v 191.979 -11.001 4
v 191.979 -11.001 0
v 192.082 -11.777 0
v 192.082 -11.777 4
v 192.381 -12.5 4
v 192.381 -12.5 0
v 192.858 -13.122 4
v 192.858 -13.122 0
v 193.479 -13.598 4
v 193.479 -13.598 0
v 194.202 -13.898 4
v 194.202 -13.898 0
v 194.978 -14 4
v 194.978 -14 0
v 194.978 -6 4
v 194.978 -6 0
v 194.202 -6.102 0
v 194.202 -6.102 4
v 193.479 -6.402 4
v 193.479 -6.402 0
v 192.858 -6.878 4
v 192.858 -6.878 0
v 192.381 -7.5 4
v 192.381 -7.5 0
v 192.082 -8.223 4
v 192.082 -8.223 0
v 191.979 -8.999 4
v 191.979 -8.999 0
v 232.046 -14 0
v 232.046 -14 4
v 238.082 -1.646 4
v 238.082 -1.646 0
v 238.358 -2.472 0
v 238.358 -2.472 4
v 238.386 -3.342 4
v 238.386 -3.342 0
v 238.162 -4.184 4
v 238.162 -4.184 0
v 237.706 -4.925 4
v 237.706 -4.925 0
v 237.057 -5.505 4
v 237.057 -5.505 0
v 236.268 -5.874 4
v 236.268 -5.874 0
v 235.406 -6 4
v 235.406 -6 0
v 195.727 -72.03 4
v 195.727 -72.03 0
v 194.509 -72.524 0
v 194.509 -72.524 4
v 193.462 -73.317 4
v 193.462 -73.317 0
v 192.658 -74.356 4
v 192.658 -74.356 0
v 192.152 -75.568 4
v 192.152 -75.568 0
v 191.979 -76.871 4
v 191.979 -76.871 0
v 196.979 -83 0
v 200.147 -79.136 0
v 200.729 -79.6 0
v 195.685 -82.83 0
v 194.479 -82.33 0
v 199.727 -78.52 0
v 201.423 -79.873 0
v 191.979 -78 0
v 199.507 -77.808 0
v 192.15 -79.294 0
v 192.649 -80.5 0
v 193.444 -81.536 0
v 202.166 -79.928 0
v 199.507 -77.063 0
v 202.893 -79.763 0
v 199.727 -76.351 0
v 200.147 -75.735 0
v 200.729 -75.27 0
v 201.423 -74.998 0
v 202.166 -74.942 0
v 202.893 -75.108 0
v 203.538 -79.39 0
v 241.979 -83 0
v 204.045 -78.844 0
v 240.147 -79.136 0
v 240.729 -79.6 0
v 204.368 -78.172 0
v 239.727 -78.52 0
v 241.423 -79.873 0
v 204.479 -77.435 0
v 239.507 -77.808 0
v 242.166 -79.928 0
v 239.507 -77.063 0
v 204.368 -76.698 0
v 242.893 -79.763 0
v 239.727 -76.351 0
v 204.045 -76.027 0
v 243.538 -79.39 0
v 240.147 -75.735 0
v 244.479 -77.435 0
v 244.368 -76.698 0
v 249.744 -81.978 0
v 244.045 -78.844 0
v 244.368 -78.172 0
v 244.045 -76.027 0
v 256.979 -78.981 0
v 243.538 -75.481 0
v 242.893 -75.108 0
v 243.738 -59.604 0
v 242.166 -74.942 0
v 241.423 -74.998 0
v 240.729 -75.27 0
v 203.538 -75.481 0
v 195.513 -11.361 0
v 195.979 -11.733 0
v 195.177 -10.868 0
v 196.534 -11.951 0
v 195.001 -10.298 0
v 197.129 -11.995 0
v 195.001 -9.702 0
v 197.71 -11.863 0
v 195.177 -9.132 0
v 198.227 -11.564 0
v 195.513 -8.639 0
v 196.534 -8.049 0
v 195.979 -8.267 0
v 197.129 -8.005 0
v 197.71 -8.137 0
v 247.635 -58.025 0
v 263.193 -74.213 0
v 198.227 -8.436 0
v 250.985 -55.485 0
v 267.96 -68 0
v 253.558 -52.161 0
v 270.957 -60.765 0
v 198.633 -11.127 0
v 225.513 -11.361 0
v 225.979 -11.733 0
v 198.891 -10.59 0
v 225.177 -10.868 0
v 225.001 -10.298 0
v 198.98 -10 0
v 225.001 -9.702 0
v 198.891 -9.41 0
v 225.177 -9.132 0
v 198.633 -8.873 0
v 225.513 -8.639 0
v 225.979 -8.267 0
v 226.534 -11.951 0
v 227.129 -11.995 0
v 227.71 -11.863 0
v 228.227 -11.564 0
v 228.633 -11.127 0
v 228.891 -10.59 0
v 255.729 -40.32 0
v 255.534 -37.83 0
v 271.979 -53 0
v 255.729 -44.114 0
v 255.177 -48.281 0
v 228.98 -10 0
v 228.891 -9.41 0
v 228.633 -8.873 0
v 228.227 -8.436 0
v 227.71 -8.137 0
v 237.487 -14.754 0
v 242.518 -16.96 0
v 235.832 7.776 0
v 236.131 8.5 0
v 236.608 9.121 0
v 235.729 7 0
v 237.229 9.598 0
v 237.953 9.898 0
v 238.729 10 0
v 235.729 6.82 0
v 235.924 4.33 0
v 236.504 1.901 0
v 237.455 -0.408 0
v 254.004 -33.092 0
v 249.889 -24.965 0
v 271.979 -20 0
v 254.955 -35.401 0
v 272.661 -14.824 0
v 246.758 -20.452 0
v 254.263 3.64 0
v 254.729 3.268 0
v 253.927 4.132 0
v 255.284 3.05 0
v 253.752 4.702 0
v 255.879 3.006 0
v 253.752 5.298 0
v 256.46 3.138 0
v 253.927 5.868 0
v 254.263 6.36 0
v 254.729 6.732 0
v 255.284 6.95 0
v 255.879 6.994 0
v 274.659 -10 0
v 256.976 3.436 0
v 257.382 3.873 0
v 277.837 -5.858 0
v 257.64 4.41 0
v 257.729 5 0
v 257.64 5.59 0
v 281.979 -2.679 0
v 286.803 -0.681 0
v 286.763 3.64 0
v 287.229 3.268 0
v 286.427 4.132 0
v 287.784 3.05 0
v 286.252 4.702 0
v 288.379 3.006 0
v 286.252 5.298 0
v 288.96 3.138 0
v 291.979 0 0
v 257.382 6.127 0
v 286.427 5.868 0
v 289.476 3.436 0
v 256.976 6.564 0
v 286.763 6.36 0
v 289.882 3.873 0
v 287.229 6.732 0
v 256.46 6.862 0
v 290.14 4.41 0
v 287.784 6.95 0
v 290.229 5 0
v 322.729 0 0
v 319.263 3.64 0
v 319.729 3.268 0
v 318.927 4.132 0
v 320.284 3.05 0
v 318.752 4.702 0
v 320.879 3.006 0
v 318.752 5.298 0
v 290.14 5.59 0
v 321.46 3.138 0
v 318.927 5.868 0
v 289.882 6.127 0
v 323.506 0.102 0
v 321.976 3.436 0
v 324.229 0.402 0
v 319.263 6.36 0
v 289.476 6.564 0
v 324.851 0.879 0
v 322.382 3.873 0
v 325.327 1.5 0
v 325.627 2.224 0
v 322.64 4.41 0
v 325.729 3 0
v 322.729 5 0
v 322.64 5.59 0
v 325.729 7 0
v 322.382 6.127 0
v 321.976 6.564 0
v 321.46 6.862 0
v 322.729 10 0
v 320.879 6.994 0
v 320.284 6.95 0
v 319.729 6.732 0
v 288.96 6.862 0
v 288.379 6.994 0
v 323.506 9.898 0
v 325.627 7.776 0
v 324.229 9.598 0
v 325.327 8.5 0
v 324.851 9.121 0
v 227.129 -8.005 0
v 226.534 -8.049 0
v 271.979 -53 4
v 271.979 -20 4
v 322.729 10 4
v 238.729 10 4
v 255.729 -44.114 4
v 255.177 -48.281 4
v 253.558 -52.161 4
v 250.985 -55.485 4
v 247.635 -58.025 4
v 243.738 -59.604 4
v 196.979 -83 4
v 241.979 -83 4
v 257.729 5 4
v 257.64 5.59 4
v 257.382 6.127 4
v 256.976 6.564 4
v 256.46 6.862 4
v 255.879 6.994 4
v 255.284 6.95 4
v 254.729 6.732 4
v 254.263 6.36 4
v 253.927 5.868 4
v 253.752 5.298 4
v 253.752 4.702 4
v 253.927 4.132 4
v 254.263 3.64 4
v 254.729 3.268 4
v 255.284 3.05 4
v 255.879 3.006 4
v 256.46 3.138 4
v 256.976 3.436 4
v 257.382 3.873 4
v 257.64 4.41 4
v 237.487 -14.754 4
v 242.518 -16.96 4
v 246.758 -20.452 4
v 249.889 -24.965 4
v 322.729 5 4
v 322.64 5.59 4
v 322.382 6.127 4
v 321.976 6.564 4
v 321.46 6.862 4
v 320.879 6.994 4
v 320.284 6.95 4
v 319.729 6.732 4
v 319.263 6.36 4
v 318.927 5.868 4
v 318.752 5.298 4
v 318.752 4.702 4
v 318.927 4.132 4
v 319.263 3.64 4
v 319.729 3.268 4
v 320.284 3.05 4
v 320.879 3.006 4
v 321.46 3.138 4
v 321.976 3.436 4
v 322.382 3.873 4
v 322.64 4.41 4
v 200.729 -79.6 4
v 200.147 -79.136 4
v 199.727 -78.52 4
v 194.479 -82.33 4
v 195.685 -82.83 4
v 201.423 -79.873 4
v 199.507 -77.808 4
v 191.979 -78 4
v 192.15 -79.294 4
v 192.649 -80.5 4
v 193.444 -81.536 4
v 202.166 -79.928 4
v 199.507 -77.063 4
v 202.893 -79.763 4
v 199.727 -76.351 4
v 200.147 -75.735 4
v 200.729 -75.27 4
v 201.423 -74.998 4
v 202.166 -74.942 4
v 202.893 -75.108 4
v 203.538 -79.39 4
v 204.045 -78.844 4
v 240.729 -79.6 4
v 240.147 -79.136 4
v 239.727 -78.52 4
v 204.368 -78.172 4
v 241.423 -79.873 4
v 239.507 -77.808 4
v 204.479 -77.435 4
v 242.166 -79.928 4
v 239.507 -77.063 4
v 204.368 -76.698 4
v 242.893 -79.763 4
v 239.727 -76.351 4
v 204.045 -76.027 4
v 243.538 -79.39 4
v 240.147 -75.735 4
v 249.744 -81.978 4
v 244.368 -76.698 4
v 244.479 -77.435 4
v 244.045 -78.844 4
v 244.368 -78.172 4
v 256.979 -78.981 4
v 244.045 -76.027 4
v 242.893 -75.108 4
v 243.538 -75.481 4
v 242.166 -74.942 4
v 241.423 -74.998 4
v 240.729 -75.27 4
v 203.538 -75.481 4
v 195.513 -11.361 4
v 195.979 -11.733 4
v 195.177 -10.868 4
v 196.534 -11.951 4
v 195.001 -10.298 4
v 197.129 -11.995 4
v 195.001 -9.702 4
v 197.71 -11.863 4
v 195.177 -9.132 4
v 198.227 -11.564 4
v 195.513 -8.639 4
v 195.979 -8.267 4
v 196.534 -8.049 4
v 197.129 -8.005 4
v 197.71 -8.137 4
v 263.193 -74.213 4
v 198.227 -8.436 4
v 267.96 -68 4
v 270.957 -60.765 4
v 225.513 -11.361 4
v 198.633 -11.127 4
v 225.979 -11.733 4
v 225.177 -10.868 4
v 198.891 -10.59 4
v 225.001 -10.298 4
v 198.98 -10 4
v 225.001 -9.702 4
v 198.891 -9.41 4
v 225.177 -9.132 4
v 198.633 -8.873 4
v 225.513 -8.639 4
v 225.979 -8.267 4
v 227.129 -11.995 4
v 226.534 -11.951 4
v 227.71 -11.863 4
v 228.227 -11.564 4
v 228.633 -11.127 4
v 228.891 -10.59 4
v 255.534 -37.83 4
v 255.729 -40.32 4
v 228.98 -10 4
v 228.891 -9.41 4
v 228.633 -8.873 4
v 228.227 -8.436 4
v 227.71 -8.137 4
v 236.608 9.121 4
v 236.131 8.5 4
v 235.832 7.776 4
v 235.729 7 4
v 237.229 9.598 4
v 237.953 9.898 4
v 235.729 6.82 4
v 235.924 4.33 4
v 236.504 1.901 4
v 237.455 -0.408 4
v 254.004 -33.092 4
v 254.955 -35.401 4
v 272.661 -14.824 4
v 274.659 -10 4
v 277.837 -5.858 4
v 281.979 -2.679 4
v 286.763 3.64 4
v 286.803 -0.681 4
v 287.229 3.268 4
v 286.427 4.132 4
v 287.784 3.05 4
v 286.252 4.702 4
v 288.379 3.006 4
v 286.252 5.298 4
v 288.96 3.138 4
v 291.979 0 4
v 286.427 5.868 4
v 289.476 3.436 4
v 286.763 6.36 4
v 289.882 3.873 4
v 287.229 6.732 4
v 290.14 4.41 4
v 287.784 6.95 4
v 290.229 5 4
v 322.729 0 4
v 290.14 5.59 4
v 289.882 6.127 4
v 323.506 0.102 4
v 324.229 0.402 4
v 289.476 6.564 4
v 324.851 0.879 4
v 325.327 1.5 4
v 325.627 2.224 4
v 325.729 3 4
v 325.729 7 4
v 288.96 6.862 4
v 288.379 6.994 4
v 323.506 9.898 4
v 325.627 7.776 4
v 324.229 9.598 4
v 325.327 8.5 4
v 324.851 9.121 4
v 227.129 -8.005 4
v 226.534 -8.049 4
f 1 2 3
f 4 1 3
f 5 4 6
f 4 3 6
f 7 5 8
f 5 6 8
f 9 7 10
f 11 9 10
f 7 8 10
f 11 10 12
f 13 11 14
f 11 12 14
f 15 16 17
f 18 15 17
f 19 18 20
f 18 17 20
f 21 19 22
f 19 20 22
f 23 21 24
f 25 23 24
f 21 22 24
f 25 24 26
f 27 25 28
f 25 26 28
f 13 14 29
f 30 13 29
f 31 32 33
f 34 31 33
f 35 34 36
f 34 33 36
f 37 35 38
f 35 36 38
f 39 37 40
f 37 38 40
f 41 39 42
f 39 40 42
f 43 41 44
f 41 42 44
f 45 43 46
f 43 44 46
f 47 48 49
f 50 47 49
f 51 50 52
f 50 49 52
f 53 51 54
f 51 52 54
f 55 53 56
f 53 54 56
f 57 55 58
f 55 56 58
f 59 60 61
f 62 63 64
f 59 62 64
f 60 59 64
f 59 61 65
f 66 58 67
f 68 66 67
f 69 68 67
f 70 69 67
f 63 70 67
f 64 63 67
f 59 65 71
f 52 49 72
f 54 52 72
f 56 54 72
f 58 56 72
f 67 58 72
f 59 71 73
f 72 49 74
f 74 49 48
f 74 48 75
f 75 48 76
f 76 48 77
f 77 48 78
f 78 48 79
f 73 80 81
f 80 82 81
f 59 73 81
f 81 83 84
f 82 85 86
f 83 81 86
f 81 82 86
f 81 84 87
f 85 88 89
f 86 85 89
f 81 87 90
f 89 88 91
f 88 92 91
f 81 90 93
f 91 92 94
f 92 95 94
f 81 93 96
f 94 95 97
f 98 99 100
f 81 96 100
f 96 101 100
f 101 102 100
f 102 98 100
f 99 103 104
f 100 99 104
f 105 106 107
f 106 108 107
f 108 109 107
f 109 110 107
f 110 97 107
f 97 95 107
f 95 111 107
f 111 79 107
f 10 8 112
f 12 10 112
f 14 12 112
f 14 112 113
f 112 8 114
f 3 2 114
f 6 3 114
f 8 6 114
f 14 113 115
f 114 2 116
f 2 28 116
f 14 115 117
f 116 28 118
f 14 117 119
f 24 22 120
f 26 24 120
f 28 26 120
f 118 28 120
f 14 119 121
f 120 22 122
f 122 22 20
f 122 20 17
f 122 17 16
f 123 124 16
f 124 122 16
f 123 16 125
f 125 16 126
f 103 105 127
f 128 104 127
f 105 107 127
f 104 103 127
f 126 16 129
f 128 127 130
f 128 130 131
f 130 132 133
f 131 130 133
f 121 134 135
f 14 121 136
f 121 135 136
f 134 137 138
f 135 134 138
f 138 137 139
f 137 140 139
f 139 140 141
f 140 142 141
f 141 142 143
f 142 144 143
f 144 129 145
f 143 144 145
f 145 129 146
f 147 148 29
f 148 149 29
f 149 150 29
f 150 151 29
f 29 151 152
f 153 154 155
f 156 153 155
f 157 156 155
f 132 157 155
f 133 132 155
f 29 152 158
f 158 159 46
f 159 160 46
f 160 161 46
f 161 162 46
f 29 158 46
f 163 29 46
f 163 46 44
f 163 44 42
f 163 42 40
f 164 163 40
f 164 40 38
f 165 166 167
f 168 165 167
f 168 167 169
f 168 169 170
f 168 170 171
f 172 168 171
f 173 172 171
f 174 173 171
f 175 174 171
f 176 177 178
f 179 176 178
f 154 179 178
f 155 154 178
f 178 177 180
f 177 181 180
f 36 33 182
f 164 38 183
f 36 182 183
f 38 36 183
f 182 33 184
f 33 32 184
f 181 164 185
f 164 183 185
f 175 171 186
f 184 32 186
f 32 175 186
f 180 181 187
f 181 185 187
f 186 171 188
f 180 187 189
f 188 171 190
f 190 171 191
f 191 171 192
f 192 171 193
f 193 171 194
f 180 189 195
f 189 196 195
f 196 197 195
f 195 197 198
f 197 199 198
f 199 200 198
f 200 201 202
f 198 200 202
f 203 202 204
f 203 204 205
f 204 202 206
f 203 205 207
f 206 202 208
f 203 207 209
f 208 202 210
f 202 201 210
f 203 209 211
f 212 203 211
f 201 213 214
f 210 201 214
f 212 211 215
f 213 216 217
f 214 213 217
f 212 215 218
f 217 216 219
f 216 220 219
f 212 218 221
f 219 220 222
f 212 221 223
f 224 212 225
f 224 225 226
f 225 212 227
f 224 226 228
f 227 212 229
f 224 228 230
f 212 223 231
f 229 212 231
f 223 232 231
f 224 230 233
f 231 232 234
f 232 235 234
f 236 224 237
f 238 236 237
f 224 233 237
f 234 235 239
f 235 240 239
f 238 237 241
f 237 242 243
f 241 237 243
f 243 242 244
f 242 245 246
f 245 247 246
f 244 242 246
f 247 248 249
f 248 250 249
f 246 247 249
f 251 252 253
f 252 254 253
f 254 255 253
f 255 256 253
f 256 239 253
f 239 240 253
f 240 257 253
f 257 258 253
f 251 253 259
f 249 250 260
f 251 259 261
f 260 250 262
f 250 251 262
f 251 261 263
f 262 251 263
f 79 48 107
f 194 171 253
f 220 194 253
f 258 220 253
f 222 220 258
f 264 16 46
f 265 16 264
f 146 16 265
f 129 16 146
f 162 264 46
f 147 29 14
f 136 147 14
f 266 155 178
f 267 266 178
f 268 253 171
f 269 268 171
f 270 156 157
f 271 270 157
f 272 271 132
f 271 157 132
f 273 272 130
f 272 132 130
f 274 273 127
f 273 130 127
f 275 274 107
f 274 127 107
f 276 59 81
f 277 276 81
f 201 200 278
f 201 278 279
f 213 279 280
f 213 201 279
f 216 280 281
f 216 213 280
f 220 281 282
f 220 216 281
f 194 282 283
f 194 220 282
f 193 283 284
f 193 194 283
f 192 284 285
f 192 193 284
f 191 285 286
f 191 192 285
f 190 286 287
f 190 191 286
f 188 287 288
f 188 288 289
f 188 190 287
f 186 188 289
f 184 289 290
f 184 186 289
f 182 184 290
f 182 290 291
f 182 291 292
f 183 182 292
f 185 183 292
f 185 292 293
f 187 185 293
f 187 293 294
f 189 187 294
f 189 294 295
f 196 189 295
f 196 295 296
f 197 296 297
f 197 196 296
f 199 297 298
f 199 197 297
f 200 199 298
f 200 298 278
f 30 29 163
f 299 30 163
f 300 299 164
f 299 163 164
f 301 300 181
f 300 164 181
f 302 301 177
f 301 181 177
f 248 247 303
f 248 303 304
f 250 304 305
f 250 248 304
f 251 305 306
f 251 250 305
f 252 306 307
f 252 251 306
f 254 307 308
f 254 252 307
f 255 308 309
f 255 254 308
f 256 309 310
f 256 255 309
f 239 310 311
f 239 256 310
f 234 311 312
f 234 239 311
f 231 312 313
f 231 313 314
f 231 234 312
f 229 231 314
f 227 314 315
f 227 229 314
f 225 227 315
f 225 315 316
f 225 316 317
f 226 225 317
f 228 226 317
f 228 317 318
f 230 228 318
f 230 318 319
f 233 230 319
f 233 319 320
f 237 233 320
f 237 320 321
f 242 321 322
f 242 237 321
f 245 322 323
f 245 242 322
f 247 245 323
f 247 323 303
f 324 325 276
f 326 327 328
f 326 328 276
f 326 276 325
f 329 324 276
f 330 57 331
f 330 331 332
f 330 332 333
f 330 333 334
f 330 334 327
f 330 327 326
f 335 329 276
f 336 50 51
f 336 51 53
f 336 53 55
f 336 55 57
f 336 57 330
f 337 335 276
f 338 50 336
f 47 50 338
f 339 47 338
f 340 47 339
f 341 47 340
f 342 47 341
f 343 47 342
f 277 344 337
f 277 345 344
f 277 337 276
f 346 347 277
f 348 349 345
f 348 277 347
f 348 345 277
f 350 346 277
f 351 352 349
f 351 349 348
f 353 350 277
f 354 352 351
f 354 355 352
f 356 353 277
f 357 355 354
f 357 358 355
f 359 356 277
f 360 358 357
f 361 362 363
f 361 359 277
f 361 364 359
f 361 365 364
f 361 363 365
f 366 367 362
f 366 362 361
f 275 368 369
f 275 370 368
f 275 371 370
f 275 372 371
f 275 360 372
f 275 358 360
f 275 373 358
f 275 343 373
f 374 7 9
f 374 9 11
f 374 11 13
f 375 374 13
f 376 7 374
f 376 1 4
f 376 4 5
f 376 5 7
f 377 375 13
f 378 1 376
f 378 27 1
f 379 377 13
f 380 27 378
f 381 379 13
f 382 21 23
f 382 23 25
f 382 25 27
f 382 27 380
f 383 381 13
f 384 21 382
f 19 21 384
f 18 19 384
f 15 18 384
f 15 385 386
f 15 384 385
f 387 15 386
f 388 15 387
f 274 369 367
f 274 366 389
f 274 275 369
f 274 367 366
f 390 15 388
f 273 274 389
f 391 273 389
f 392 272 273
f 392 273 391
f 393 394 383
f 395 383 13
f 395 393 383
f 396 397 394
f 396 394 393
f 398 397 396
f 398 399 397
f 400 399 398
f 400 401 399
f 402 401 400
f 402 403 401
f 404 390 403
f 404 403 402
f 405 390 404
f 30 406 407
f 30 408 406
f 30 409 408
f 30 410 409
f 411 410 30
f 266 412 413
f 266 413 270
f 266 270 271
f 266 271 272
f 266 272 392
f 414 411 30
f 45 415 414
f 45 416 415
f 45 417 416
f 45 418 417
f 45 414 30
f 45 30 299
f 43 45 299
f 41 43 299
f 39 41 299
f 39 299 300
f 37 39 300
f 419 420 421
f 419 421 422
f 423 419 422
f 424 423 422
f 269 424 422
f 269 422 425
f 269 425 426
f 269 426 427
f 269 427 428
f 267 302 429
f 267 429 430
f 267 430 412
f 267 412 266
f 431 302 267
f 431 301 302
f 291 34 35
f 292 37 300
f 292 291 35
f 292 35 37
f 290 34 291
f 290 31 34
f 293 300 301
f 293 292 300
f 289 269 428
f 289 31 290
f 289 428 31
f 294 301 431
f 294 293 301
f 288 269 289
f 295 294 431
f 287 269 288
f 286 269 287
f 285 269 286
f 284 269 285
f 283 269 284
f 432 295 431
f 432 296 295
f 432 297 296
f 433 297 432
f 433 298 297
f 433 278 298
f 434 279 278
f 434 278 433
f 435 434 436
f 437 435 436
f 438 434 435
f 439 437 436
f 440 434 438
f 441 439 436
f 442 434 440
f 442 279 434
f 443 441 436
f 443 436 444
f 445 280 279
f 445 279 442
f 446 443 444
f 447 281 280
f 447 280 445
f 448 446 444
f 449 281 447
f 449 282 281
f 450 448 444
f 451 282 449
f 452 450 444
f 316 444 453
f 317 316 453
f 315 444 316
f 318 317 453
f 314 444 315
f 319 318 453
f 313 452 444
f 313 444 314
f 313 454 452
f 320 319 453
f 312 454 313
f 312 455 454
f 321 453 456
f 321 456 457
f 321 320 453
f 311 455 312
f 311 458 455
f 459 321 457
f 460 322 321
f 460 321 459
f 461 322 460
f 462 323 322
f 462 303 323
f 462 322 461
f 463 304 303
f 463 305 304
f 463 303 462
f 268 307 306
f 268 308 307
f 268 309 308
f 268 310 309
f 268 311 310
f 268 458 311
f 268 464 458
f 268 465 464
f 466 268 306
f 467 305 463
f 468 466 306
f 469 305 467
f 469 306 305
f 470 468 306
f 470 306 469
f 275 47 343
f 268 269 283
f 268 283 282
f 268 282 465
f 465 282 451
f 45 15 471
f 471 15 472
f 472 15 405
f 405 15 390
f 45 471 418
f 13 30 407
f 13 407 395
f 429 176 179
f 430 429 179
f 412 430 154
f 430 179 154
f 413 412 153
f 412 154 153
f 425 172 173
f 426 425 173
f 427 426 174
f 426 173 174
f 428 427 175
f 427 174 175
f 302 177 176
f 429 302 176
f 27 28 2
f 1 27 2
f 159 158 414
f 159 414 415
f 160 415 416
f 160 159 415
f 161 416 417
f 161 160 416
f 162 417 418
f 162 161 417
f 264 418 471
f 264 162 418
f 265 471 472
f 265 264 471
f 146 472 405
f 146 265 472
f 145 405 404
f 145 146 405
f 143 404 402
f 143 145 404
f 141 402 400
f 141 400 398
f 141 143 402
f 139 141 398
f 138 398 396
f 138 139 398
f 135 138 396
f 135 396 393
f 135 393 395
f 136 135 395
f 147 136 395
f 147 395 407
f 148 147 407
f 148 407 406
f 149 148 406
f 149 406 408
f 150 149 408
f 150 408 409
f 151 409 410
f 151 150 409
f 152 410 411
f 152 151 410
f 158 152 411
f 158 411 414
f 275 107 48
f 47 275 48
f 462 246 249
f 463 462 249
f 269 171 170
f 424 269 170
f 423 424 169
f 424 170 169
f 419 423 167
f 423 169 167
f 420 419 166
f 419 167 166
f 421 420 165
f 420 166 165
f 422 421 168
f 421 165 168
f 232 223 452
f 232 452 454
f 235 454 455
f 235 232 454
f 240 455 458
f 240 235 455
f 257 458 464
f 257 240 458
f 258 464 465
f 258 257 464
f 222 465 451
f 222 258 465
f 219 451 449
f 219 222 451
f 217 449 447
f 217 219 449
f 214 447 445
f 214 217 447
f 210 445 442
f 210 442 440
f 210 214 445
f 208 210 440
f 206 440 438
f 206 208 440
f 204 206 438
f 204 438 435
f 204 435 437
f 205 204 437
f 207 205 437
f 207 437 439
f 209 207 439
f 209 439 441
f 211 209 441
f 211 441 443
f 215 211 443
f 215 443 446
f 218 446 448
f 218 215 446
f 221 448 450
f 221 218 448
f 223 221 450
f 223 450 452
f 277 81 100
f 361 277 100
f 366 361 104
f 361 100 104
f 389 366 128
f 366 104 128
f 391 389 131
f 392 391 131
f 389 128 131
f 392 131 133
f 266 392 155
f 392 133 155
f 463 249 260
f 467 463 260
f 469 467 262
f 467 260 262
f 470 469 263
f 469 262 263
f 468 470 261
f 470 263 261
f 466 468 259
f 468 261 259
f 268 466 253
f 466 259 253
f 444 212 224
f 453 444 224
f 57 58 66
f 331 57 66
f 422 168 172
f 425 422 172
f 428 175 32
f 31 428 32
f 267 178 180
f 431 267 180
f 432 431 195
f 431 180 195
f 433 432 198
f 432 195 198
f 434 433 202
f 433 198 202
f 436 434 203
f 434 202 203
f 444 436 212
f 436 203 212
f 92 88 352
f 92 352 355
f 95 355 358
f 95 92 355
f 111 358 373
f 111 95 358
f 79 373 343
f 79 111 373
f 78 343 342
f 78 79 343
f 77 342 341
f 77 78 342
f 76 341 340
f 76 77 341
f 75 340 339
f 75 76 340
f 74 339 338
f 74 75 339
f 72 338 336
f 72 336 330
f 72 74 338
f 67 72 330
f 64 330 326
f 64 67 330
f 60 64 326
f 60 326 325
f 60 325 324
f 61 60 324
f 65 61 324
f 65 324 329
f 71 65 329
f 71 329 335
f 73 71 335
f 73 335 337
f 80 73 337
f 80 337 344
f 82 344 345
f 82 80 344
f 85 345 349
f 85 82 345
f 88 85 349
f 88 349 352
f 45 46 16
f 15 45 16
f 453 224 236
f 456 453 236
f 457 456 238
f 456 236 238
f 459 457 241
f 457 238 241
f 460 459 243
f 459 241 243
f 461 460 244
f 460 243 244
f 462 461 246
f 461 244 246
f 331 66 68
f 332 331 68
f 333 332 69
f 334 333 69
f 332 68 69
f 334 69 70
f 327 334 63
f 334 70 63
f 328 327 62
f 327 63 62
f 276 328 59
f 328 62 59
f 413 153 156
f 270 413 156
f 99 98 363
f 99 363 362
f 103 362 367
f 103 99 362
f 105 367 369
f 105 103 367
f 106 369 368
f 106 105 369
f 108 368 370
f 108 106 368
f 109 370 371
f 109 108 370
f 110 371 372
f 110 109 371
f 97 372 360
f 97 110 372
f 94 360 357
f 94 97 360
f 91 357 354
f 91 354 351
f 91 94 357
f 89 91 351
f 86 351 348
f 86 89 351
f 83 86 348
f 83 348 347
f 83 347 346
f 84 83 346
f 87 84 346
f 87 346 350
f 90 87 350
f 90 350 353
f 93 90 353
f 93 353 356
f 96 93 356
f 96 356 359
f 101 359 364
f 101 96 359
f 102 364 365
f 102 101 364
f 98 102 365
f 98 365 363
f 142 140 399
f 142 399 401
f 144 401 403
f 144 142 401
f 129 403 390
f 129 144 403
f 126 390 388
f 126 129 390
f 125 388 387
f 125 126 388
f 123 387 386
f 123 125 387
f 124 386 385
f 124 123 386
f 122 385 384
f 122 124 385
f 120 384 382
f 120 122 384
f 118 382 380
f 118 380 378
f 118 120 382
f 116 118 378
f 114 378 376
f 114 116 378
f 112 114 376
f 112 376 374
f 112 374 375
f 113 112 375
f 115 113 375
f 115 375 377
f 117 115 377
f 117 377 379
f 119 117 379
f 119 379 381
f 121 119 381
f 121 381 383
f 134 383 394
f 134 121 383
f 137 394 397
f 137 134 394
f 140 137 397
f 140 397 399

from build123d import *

# Parameters (mm, degrees)
SKETCH1_R           = 2.001
SKETCH1_R_2         = 2.5
SKETCH1_R_3         = 2
BOSS_EXTRUDE2_DEPTH = 4


with BuildPart() as part:
    # Sketch1 → Boss-Extrude2 (new body)
    with BuildSketch(Plane.XY):
        with BuildLine():
            Line((249.889094902, -24.965497133), (254.003864049, -33.092166198))
            ThreePointArc((254.003864049, -33.092166198), (255.292000843, -36.604410668), (255.729349518, -40.319768492))
            Line((255.729349518, -40.319768492), (255.729349518, -44.113946135))
            ThreePointArc((255.729349518, -44.113946135), (252.381328024, -53.908201589), (243.738419531, -59.60353482))
            Line((243.738419531, -59.60353482), (195.72651514, -72.030145369))
            ThreePointArc((195.72651514, -72.030145369), (193.025606236, -73.809937003), (191.979349518, -76.870641833))
            Line((191.979349518, -76.870641833), (191.979349518, -78))
            ThreePointArc((191.979349518, -78), (193.443815613, -81.535533906), (196.979349518, -83))
            Line((196.979349518, -83), (241.979349518, -83))
            ThreePointArc((241.979349518, -83), (263.192552954, -74.213203436), (271.979349518, -53))
            Line((271.979349518, -53), (271.979349518, -20))
            ThreePointArc((271.979349518, -20), (277.837213895, -5.857864376), (291.979349518, 0))
            Line((291.979349518, 0), (322.729349518, 0))
            ThreePointArc((322.729349518, 0), (324.850669862, 0.878679656), (325.729349518, 3))
            Line((325.729349518, 3), (325.729349518, 7))
            ThreePointArc((325.729349518, 7), (324.850669862, 9.121320344), (322.729349518, 10))
            Line((322.729349518, 10), (238.729349518, 10))
            ThreePointArc((238.729349518, 10), (236.608029175, 9.121320344), (235.729349518, 7))
            Line((235.729349518, 7), (235.729349518, 6.819768492))
            ThreePointArc((235.729349518, 6.819768492), (236.166698194, 3.104410668), (237.454834988, -0.407833802))
            Line((237.454834988, -0.407833802), (238.081894478, -1.646276295))
            ThreePointArc((238.081894478, -1.646276295), (237.961390247, -4.571220464), (235.406315161, -6))
            Line((235.406315161, -6), (194.978349518, -6))
            ThreePointArc((194.978349518, -6), (192.857736282, -6.878386763), (191.979349518, -8.999))
            Line((191.979349518, -8.999), (191.979349518, -11.001))
            ThreePointArc((191.979349518, -11.001), (192.857736282, -13.121613237), (194.978349518, -14))
            Line((194.978349518, -14), (232.045951739, -14))
            ThreePointArc((232.045951739, -14), (242.517578705, -16.960486255), (249.889094902, -24.965497133))
        make_face()
        with Locations((226.979349518, -10)):
            Circle(SKETCH1_R, mode=Mode.SUBTRACT)
        with Locations((196.979349518, -10)):
            Circle(SKETCH1_R, mode=Mode.SUBTRACT)
        with Locations((201.979349518, -77.435320916)):
            Circle(SKETCH1_R_2, mode=Mode.SUBTRACT)
        with Locations((241.979349518, -77.435320916)):
            Circle(SKETCH1_R_2, mode=Mode.SUBTRACT)
        with Locations((255.729349518, 5)):
            Circle(SKETCH1_R_3, mode=Mode.SUBTRACT)
        with Locations((288.229349518, 5)):
            Circle(SKETCH1_R_3, mode=Mode.SUBTRACT)
        with Locations((320.729349518, 5)):
            Circle(SKETCH1_R_3, mode=Mode.SUBTRACT)
    extrude(amount=BOSS_EXTRUDE2_DEPTH)


solid = part.part
